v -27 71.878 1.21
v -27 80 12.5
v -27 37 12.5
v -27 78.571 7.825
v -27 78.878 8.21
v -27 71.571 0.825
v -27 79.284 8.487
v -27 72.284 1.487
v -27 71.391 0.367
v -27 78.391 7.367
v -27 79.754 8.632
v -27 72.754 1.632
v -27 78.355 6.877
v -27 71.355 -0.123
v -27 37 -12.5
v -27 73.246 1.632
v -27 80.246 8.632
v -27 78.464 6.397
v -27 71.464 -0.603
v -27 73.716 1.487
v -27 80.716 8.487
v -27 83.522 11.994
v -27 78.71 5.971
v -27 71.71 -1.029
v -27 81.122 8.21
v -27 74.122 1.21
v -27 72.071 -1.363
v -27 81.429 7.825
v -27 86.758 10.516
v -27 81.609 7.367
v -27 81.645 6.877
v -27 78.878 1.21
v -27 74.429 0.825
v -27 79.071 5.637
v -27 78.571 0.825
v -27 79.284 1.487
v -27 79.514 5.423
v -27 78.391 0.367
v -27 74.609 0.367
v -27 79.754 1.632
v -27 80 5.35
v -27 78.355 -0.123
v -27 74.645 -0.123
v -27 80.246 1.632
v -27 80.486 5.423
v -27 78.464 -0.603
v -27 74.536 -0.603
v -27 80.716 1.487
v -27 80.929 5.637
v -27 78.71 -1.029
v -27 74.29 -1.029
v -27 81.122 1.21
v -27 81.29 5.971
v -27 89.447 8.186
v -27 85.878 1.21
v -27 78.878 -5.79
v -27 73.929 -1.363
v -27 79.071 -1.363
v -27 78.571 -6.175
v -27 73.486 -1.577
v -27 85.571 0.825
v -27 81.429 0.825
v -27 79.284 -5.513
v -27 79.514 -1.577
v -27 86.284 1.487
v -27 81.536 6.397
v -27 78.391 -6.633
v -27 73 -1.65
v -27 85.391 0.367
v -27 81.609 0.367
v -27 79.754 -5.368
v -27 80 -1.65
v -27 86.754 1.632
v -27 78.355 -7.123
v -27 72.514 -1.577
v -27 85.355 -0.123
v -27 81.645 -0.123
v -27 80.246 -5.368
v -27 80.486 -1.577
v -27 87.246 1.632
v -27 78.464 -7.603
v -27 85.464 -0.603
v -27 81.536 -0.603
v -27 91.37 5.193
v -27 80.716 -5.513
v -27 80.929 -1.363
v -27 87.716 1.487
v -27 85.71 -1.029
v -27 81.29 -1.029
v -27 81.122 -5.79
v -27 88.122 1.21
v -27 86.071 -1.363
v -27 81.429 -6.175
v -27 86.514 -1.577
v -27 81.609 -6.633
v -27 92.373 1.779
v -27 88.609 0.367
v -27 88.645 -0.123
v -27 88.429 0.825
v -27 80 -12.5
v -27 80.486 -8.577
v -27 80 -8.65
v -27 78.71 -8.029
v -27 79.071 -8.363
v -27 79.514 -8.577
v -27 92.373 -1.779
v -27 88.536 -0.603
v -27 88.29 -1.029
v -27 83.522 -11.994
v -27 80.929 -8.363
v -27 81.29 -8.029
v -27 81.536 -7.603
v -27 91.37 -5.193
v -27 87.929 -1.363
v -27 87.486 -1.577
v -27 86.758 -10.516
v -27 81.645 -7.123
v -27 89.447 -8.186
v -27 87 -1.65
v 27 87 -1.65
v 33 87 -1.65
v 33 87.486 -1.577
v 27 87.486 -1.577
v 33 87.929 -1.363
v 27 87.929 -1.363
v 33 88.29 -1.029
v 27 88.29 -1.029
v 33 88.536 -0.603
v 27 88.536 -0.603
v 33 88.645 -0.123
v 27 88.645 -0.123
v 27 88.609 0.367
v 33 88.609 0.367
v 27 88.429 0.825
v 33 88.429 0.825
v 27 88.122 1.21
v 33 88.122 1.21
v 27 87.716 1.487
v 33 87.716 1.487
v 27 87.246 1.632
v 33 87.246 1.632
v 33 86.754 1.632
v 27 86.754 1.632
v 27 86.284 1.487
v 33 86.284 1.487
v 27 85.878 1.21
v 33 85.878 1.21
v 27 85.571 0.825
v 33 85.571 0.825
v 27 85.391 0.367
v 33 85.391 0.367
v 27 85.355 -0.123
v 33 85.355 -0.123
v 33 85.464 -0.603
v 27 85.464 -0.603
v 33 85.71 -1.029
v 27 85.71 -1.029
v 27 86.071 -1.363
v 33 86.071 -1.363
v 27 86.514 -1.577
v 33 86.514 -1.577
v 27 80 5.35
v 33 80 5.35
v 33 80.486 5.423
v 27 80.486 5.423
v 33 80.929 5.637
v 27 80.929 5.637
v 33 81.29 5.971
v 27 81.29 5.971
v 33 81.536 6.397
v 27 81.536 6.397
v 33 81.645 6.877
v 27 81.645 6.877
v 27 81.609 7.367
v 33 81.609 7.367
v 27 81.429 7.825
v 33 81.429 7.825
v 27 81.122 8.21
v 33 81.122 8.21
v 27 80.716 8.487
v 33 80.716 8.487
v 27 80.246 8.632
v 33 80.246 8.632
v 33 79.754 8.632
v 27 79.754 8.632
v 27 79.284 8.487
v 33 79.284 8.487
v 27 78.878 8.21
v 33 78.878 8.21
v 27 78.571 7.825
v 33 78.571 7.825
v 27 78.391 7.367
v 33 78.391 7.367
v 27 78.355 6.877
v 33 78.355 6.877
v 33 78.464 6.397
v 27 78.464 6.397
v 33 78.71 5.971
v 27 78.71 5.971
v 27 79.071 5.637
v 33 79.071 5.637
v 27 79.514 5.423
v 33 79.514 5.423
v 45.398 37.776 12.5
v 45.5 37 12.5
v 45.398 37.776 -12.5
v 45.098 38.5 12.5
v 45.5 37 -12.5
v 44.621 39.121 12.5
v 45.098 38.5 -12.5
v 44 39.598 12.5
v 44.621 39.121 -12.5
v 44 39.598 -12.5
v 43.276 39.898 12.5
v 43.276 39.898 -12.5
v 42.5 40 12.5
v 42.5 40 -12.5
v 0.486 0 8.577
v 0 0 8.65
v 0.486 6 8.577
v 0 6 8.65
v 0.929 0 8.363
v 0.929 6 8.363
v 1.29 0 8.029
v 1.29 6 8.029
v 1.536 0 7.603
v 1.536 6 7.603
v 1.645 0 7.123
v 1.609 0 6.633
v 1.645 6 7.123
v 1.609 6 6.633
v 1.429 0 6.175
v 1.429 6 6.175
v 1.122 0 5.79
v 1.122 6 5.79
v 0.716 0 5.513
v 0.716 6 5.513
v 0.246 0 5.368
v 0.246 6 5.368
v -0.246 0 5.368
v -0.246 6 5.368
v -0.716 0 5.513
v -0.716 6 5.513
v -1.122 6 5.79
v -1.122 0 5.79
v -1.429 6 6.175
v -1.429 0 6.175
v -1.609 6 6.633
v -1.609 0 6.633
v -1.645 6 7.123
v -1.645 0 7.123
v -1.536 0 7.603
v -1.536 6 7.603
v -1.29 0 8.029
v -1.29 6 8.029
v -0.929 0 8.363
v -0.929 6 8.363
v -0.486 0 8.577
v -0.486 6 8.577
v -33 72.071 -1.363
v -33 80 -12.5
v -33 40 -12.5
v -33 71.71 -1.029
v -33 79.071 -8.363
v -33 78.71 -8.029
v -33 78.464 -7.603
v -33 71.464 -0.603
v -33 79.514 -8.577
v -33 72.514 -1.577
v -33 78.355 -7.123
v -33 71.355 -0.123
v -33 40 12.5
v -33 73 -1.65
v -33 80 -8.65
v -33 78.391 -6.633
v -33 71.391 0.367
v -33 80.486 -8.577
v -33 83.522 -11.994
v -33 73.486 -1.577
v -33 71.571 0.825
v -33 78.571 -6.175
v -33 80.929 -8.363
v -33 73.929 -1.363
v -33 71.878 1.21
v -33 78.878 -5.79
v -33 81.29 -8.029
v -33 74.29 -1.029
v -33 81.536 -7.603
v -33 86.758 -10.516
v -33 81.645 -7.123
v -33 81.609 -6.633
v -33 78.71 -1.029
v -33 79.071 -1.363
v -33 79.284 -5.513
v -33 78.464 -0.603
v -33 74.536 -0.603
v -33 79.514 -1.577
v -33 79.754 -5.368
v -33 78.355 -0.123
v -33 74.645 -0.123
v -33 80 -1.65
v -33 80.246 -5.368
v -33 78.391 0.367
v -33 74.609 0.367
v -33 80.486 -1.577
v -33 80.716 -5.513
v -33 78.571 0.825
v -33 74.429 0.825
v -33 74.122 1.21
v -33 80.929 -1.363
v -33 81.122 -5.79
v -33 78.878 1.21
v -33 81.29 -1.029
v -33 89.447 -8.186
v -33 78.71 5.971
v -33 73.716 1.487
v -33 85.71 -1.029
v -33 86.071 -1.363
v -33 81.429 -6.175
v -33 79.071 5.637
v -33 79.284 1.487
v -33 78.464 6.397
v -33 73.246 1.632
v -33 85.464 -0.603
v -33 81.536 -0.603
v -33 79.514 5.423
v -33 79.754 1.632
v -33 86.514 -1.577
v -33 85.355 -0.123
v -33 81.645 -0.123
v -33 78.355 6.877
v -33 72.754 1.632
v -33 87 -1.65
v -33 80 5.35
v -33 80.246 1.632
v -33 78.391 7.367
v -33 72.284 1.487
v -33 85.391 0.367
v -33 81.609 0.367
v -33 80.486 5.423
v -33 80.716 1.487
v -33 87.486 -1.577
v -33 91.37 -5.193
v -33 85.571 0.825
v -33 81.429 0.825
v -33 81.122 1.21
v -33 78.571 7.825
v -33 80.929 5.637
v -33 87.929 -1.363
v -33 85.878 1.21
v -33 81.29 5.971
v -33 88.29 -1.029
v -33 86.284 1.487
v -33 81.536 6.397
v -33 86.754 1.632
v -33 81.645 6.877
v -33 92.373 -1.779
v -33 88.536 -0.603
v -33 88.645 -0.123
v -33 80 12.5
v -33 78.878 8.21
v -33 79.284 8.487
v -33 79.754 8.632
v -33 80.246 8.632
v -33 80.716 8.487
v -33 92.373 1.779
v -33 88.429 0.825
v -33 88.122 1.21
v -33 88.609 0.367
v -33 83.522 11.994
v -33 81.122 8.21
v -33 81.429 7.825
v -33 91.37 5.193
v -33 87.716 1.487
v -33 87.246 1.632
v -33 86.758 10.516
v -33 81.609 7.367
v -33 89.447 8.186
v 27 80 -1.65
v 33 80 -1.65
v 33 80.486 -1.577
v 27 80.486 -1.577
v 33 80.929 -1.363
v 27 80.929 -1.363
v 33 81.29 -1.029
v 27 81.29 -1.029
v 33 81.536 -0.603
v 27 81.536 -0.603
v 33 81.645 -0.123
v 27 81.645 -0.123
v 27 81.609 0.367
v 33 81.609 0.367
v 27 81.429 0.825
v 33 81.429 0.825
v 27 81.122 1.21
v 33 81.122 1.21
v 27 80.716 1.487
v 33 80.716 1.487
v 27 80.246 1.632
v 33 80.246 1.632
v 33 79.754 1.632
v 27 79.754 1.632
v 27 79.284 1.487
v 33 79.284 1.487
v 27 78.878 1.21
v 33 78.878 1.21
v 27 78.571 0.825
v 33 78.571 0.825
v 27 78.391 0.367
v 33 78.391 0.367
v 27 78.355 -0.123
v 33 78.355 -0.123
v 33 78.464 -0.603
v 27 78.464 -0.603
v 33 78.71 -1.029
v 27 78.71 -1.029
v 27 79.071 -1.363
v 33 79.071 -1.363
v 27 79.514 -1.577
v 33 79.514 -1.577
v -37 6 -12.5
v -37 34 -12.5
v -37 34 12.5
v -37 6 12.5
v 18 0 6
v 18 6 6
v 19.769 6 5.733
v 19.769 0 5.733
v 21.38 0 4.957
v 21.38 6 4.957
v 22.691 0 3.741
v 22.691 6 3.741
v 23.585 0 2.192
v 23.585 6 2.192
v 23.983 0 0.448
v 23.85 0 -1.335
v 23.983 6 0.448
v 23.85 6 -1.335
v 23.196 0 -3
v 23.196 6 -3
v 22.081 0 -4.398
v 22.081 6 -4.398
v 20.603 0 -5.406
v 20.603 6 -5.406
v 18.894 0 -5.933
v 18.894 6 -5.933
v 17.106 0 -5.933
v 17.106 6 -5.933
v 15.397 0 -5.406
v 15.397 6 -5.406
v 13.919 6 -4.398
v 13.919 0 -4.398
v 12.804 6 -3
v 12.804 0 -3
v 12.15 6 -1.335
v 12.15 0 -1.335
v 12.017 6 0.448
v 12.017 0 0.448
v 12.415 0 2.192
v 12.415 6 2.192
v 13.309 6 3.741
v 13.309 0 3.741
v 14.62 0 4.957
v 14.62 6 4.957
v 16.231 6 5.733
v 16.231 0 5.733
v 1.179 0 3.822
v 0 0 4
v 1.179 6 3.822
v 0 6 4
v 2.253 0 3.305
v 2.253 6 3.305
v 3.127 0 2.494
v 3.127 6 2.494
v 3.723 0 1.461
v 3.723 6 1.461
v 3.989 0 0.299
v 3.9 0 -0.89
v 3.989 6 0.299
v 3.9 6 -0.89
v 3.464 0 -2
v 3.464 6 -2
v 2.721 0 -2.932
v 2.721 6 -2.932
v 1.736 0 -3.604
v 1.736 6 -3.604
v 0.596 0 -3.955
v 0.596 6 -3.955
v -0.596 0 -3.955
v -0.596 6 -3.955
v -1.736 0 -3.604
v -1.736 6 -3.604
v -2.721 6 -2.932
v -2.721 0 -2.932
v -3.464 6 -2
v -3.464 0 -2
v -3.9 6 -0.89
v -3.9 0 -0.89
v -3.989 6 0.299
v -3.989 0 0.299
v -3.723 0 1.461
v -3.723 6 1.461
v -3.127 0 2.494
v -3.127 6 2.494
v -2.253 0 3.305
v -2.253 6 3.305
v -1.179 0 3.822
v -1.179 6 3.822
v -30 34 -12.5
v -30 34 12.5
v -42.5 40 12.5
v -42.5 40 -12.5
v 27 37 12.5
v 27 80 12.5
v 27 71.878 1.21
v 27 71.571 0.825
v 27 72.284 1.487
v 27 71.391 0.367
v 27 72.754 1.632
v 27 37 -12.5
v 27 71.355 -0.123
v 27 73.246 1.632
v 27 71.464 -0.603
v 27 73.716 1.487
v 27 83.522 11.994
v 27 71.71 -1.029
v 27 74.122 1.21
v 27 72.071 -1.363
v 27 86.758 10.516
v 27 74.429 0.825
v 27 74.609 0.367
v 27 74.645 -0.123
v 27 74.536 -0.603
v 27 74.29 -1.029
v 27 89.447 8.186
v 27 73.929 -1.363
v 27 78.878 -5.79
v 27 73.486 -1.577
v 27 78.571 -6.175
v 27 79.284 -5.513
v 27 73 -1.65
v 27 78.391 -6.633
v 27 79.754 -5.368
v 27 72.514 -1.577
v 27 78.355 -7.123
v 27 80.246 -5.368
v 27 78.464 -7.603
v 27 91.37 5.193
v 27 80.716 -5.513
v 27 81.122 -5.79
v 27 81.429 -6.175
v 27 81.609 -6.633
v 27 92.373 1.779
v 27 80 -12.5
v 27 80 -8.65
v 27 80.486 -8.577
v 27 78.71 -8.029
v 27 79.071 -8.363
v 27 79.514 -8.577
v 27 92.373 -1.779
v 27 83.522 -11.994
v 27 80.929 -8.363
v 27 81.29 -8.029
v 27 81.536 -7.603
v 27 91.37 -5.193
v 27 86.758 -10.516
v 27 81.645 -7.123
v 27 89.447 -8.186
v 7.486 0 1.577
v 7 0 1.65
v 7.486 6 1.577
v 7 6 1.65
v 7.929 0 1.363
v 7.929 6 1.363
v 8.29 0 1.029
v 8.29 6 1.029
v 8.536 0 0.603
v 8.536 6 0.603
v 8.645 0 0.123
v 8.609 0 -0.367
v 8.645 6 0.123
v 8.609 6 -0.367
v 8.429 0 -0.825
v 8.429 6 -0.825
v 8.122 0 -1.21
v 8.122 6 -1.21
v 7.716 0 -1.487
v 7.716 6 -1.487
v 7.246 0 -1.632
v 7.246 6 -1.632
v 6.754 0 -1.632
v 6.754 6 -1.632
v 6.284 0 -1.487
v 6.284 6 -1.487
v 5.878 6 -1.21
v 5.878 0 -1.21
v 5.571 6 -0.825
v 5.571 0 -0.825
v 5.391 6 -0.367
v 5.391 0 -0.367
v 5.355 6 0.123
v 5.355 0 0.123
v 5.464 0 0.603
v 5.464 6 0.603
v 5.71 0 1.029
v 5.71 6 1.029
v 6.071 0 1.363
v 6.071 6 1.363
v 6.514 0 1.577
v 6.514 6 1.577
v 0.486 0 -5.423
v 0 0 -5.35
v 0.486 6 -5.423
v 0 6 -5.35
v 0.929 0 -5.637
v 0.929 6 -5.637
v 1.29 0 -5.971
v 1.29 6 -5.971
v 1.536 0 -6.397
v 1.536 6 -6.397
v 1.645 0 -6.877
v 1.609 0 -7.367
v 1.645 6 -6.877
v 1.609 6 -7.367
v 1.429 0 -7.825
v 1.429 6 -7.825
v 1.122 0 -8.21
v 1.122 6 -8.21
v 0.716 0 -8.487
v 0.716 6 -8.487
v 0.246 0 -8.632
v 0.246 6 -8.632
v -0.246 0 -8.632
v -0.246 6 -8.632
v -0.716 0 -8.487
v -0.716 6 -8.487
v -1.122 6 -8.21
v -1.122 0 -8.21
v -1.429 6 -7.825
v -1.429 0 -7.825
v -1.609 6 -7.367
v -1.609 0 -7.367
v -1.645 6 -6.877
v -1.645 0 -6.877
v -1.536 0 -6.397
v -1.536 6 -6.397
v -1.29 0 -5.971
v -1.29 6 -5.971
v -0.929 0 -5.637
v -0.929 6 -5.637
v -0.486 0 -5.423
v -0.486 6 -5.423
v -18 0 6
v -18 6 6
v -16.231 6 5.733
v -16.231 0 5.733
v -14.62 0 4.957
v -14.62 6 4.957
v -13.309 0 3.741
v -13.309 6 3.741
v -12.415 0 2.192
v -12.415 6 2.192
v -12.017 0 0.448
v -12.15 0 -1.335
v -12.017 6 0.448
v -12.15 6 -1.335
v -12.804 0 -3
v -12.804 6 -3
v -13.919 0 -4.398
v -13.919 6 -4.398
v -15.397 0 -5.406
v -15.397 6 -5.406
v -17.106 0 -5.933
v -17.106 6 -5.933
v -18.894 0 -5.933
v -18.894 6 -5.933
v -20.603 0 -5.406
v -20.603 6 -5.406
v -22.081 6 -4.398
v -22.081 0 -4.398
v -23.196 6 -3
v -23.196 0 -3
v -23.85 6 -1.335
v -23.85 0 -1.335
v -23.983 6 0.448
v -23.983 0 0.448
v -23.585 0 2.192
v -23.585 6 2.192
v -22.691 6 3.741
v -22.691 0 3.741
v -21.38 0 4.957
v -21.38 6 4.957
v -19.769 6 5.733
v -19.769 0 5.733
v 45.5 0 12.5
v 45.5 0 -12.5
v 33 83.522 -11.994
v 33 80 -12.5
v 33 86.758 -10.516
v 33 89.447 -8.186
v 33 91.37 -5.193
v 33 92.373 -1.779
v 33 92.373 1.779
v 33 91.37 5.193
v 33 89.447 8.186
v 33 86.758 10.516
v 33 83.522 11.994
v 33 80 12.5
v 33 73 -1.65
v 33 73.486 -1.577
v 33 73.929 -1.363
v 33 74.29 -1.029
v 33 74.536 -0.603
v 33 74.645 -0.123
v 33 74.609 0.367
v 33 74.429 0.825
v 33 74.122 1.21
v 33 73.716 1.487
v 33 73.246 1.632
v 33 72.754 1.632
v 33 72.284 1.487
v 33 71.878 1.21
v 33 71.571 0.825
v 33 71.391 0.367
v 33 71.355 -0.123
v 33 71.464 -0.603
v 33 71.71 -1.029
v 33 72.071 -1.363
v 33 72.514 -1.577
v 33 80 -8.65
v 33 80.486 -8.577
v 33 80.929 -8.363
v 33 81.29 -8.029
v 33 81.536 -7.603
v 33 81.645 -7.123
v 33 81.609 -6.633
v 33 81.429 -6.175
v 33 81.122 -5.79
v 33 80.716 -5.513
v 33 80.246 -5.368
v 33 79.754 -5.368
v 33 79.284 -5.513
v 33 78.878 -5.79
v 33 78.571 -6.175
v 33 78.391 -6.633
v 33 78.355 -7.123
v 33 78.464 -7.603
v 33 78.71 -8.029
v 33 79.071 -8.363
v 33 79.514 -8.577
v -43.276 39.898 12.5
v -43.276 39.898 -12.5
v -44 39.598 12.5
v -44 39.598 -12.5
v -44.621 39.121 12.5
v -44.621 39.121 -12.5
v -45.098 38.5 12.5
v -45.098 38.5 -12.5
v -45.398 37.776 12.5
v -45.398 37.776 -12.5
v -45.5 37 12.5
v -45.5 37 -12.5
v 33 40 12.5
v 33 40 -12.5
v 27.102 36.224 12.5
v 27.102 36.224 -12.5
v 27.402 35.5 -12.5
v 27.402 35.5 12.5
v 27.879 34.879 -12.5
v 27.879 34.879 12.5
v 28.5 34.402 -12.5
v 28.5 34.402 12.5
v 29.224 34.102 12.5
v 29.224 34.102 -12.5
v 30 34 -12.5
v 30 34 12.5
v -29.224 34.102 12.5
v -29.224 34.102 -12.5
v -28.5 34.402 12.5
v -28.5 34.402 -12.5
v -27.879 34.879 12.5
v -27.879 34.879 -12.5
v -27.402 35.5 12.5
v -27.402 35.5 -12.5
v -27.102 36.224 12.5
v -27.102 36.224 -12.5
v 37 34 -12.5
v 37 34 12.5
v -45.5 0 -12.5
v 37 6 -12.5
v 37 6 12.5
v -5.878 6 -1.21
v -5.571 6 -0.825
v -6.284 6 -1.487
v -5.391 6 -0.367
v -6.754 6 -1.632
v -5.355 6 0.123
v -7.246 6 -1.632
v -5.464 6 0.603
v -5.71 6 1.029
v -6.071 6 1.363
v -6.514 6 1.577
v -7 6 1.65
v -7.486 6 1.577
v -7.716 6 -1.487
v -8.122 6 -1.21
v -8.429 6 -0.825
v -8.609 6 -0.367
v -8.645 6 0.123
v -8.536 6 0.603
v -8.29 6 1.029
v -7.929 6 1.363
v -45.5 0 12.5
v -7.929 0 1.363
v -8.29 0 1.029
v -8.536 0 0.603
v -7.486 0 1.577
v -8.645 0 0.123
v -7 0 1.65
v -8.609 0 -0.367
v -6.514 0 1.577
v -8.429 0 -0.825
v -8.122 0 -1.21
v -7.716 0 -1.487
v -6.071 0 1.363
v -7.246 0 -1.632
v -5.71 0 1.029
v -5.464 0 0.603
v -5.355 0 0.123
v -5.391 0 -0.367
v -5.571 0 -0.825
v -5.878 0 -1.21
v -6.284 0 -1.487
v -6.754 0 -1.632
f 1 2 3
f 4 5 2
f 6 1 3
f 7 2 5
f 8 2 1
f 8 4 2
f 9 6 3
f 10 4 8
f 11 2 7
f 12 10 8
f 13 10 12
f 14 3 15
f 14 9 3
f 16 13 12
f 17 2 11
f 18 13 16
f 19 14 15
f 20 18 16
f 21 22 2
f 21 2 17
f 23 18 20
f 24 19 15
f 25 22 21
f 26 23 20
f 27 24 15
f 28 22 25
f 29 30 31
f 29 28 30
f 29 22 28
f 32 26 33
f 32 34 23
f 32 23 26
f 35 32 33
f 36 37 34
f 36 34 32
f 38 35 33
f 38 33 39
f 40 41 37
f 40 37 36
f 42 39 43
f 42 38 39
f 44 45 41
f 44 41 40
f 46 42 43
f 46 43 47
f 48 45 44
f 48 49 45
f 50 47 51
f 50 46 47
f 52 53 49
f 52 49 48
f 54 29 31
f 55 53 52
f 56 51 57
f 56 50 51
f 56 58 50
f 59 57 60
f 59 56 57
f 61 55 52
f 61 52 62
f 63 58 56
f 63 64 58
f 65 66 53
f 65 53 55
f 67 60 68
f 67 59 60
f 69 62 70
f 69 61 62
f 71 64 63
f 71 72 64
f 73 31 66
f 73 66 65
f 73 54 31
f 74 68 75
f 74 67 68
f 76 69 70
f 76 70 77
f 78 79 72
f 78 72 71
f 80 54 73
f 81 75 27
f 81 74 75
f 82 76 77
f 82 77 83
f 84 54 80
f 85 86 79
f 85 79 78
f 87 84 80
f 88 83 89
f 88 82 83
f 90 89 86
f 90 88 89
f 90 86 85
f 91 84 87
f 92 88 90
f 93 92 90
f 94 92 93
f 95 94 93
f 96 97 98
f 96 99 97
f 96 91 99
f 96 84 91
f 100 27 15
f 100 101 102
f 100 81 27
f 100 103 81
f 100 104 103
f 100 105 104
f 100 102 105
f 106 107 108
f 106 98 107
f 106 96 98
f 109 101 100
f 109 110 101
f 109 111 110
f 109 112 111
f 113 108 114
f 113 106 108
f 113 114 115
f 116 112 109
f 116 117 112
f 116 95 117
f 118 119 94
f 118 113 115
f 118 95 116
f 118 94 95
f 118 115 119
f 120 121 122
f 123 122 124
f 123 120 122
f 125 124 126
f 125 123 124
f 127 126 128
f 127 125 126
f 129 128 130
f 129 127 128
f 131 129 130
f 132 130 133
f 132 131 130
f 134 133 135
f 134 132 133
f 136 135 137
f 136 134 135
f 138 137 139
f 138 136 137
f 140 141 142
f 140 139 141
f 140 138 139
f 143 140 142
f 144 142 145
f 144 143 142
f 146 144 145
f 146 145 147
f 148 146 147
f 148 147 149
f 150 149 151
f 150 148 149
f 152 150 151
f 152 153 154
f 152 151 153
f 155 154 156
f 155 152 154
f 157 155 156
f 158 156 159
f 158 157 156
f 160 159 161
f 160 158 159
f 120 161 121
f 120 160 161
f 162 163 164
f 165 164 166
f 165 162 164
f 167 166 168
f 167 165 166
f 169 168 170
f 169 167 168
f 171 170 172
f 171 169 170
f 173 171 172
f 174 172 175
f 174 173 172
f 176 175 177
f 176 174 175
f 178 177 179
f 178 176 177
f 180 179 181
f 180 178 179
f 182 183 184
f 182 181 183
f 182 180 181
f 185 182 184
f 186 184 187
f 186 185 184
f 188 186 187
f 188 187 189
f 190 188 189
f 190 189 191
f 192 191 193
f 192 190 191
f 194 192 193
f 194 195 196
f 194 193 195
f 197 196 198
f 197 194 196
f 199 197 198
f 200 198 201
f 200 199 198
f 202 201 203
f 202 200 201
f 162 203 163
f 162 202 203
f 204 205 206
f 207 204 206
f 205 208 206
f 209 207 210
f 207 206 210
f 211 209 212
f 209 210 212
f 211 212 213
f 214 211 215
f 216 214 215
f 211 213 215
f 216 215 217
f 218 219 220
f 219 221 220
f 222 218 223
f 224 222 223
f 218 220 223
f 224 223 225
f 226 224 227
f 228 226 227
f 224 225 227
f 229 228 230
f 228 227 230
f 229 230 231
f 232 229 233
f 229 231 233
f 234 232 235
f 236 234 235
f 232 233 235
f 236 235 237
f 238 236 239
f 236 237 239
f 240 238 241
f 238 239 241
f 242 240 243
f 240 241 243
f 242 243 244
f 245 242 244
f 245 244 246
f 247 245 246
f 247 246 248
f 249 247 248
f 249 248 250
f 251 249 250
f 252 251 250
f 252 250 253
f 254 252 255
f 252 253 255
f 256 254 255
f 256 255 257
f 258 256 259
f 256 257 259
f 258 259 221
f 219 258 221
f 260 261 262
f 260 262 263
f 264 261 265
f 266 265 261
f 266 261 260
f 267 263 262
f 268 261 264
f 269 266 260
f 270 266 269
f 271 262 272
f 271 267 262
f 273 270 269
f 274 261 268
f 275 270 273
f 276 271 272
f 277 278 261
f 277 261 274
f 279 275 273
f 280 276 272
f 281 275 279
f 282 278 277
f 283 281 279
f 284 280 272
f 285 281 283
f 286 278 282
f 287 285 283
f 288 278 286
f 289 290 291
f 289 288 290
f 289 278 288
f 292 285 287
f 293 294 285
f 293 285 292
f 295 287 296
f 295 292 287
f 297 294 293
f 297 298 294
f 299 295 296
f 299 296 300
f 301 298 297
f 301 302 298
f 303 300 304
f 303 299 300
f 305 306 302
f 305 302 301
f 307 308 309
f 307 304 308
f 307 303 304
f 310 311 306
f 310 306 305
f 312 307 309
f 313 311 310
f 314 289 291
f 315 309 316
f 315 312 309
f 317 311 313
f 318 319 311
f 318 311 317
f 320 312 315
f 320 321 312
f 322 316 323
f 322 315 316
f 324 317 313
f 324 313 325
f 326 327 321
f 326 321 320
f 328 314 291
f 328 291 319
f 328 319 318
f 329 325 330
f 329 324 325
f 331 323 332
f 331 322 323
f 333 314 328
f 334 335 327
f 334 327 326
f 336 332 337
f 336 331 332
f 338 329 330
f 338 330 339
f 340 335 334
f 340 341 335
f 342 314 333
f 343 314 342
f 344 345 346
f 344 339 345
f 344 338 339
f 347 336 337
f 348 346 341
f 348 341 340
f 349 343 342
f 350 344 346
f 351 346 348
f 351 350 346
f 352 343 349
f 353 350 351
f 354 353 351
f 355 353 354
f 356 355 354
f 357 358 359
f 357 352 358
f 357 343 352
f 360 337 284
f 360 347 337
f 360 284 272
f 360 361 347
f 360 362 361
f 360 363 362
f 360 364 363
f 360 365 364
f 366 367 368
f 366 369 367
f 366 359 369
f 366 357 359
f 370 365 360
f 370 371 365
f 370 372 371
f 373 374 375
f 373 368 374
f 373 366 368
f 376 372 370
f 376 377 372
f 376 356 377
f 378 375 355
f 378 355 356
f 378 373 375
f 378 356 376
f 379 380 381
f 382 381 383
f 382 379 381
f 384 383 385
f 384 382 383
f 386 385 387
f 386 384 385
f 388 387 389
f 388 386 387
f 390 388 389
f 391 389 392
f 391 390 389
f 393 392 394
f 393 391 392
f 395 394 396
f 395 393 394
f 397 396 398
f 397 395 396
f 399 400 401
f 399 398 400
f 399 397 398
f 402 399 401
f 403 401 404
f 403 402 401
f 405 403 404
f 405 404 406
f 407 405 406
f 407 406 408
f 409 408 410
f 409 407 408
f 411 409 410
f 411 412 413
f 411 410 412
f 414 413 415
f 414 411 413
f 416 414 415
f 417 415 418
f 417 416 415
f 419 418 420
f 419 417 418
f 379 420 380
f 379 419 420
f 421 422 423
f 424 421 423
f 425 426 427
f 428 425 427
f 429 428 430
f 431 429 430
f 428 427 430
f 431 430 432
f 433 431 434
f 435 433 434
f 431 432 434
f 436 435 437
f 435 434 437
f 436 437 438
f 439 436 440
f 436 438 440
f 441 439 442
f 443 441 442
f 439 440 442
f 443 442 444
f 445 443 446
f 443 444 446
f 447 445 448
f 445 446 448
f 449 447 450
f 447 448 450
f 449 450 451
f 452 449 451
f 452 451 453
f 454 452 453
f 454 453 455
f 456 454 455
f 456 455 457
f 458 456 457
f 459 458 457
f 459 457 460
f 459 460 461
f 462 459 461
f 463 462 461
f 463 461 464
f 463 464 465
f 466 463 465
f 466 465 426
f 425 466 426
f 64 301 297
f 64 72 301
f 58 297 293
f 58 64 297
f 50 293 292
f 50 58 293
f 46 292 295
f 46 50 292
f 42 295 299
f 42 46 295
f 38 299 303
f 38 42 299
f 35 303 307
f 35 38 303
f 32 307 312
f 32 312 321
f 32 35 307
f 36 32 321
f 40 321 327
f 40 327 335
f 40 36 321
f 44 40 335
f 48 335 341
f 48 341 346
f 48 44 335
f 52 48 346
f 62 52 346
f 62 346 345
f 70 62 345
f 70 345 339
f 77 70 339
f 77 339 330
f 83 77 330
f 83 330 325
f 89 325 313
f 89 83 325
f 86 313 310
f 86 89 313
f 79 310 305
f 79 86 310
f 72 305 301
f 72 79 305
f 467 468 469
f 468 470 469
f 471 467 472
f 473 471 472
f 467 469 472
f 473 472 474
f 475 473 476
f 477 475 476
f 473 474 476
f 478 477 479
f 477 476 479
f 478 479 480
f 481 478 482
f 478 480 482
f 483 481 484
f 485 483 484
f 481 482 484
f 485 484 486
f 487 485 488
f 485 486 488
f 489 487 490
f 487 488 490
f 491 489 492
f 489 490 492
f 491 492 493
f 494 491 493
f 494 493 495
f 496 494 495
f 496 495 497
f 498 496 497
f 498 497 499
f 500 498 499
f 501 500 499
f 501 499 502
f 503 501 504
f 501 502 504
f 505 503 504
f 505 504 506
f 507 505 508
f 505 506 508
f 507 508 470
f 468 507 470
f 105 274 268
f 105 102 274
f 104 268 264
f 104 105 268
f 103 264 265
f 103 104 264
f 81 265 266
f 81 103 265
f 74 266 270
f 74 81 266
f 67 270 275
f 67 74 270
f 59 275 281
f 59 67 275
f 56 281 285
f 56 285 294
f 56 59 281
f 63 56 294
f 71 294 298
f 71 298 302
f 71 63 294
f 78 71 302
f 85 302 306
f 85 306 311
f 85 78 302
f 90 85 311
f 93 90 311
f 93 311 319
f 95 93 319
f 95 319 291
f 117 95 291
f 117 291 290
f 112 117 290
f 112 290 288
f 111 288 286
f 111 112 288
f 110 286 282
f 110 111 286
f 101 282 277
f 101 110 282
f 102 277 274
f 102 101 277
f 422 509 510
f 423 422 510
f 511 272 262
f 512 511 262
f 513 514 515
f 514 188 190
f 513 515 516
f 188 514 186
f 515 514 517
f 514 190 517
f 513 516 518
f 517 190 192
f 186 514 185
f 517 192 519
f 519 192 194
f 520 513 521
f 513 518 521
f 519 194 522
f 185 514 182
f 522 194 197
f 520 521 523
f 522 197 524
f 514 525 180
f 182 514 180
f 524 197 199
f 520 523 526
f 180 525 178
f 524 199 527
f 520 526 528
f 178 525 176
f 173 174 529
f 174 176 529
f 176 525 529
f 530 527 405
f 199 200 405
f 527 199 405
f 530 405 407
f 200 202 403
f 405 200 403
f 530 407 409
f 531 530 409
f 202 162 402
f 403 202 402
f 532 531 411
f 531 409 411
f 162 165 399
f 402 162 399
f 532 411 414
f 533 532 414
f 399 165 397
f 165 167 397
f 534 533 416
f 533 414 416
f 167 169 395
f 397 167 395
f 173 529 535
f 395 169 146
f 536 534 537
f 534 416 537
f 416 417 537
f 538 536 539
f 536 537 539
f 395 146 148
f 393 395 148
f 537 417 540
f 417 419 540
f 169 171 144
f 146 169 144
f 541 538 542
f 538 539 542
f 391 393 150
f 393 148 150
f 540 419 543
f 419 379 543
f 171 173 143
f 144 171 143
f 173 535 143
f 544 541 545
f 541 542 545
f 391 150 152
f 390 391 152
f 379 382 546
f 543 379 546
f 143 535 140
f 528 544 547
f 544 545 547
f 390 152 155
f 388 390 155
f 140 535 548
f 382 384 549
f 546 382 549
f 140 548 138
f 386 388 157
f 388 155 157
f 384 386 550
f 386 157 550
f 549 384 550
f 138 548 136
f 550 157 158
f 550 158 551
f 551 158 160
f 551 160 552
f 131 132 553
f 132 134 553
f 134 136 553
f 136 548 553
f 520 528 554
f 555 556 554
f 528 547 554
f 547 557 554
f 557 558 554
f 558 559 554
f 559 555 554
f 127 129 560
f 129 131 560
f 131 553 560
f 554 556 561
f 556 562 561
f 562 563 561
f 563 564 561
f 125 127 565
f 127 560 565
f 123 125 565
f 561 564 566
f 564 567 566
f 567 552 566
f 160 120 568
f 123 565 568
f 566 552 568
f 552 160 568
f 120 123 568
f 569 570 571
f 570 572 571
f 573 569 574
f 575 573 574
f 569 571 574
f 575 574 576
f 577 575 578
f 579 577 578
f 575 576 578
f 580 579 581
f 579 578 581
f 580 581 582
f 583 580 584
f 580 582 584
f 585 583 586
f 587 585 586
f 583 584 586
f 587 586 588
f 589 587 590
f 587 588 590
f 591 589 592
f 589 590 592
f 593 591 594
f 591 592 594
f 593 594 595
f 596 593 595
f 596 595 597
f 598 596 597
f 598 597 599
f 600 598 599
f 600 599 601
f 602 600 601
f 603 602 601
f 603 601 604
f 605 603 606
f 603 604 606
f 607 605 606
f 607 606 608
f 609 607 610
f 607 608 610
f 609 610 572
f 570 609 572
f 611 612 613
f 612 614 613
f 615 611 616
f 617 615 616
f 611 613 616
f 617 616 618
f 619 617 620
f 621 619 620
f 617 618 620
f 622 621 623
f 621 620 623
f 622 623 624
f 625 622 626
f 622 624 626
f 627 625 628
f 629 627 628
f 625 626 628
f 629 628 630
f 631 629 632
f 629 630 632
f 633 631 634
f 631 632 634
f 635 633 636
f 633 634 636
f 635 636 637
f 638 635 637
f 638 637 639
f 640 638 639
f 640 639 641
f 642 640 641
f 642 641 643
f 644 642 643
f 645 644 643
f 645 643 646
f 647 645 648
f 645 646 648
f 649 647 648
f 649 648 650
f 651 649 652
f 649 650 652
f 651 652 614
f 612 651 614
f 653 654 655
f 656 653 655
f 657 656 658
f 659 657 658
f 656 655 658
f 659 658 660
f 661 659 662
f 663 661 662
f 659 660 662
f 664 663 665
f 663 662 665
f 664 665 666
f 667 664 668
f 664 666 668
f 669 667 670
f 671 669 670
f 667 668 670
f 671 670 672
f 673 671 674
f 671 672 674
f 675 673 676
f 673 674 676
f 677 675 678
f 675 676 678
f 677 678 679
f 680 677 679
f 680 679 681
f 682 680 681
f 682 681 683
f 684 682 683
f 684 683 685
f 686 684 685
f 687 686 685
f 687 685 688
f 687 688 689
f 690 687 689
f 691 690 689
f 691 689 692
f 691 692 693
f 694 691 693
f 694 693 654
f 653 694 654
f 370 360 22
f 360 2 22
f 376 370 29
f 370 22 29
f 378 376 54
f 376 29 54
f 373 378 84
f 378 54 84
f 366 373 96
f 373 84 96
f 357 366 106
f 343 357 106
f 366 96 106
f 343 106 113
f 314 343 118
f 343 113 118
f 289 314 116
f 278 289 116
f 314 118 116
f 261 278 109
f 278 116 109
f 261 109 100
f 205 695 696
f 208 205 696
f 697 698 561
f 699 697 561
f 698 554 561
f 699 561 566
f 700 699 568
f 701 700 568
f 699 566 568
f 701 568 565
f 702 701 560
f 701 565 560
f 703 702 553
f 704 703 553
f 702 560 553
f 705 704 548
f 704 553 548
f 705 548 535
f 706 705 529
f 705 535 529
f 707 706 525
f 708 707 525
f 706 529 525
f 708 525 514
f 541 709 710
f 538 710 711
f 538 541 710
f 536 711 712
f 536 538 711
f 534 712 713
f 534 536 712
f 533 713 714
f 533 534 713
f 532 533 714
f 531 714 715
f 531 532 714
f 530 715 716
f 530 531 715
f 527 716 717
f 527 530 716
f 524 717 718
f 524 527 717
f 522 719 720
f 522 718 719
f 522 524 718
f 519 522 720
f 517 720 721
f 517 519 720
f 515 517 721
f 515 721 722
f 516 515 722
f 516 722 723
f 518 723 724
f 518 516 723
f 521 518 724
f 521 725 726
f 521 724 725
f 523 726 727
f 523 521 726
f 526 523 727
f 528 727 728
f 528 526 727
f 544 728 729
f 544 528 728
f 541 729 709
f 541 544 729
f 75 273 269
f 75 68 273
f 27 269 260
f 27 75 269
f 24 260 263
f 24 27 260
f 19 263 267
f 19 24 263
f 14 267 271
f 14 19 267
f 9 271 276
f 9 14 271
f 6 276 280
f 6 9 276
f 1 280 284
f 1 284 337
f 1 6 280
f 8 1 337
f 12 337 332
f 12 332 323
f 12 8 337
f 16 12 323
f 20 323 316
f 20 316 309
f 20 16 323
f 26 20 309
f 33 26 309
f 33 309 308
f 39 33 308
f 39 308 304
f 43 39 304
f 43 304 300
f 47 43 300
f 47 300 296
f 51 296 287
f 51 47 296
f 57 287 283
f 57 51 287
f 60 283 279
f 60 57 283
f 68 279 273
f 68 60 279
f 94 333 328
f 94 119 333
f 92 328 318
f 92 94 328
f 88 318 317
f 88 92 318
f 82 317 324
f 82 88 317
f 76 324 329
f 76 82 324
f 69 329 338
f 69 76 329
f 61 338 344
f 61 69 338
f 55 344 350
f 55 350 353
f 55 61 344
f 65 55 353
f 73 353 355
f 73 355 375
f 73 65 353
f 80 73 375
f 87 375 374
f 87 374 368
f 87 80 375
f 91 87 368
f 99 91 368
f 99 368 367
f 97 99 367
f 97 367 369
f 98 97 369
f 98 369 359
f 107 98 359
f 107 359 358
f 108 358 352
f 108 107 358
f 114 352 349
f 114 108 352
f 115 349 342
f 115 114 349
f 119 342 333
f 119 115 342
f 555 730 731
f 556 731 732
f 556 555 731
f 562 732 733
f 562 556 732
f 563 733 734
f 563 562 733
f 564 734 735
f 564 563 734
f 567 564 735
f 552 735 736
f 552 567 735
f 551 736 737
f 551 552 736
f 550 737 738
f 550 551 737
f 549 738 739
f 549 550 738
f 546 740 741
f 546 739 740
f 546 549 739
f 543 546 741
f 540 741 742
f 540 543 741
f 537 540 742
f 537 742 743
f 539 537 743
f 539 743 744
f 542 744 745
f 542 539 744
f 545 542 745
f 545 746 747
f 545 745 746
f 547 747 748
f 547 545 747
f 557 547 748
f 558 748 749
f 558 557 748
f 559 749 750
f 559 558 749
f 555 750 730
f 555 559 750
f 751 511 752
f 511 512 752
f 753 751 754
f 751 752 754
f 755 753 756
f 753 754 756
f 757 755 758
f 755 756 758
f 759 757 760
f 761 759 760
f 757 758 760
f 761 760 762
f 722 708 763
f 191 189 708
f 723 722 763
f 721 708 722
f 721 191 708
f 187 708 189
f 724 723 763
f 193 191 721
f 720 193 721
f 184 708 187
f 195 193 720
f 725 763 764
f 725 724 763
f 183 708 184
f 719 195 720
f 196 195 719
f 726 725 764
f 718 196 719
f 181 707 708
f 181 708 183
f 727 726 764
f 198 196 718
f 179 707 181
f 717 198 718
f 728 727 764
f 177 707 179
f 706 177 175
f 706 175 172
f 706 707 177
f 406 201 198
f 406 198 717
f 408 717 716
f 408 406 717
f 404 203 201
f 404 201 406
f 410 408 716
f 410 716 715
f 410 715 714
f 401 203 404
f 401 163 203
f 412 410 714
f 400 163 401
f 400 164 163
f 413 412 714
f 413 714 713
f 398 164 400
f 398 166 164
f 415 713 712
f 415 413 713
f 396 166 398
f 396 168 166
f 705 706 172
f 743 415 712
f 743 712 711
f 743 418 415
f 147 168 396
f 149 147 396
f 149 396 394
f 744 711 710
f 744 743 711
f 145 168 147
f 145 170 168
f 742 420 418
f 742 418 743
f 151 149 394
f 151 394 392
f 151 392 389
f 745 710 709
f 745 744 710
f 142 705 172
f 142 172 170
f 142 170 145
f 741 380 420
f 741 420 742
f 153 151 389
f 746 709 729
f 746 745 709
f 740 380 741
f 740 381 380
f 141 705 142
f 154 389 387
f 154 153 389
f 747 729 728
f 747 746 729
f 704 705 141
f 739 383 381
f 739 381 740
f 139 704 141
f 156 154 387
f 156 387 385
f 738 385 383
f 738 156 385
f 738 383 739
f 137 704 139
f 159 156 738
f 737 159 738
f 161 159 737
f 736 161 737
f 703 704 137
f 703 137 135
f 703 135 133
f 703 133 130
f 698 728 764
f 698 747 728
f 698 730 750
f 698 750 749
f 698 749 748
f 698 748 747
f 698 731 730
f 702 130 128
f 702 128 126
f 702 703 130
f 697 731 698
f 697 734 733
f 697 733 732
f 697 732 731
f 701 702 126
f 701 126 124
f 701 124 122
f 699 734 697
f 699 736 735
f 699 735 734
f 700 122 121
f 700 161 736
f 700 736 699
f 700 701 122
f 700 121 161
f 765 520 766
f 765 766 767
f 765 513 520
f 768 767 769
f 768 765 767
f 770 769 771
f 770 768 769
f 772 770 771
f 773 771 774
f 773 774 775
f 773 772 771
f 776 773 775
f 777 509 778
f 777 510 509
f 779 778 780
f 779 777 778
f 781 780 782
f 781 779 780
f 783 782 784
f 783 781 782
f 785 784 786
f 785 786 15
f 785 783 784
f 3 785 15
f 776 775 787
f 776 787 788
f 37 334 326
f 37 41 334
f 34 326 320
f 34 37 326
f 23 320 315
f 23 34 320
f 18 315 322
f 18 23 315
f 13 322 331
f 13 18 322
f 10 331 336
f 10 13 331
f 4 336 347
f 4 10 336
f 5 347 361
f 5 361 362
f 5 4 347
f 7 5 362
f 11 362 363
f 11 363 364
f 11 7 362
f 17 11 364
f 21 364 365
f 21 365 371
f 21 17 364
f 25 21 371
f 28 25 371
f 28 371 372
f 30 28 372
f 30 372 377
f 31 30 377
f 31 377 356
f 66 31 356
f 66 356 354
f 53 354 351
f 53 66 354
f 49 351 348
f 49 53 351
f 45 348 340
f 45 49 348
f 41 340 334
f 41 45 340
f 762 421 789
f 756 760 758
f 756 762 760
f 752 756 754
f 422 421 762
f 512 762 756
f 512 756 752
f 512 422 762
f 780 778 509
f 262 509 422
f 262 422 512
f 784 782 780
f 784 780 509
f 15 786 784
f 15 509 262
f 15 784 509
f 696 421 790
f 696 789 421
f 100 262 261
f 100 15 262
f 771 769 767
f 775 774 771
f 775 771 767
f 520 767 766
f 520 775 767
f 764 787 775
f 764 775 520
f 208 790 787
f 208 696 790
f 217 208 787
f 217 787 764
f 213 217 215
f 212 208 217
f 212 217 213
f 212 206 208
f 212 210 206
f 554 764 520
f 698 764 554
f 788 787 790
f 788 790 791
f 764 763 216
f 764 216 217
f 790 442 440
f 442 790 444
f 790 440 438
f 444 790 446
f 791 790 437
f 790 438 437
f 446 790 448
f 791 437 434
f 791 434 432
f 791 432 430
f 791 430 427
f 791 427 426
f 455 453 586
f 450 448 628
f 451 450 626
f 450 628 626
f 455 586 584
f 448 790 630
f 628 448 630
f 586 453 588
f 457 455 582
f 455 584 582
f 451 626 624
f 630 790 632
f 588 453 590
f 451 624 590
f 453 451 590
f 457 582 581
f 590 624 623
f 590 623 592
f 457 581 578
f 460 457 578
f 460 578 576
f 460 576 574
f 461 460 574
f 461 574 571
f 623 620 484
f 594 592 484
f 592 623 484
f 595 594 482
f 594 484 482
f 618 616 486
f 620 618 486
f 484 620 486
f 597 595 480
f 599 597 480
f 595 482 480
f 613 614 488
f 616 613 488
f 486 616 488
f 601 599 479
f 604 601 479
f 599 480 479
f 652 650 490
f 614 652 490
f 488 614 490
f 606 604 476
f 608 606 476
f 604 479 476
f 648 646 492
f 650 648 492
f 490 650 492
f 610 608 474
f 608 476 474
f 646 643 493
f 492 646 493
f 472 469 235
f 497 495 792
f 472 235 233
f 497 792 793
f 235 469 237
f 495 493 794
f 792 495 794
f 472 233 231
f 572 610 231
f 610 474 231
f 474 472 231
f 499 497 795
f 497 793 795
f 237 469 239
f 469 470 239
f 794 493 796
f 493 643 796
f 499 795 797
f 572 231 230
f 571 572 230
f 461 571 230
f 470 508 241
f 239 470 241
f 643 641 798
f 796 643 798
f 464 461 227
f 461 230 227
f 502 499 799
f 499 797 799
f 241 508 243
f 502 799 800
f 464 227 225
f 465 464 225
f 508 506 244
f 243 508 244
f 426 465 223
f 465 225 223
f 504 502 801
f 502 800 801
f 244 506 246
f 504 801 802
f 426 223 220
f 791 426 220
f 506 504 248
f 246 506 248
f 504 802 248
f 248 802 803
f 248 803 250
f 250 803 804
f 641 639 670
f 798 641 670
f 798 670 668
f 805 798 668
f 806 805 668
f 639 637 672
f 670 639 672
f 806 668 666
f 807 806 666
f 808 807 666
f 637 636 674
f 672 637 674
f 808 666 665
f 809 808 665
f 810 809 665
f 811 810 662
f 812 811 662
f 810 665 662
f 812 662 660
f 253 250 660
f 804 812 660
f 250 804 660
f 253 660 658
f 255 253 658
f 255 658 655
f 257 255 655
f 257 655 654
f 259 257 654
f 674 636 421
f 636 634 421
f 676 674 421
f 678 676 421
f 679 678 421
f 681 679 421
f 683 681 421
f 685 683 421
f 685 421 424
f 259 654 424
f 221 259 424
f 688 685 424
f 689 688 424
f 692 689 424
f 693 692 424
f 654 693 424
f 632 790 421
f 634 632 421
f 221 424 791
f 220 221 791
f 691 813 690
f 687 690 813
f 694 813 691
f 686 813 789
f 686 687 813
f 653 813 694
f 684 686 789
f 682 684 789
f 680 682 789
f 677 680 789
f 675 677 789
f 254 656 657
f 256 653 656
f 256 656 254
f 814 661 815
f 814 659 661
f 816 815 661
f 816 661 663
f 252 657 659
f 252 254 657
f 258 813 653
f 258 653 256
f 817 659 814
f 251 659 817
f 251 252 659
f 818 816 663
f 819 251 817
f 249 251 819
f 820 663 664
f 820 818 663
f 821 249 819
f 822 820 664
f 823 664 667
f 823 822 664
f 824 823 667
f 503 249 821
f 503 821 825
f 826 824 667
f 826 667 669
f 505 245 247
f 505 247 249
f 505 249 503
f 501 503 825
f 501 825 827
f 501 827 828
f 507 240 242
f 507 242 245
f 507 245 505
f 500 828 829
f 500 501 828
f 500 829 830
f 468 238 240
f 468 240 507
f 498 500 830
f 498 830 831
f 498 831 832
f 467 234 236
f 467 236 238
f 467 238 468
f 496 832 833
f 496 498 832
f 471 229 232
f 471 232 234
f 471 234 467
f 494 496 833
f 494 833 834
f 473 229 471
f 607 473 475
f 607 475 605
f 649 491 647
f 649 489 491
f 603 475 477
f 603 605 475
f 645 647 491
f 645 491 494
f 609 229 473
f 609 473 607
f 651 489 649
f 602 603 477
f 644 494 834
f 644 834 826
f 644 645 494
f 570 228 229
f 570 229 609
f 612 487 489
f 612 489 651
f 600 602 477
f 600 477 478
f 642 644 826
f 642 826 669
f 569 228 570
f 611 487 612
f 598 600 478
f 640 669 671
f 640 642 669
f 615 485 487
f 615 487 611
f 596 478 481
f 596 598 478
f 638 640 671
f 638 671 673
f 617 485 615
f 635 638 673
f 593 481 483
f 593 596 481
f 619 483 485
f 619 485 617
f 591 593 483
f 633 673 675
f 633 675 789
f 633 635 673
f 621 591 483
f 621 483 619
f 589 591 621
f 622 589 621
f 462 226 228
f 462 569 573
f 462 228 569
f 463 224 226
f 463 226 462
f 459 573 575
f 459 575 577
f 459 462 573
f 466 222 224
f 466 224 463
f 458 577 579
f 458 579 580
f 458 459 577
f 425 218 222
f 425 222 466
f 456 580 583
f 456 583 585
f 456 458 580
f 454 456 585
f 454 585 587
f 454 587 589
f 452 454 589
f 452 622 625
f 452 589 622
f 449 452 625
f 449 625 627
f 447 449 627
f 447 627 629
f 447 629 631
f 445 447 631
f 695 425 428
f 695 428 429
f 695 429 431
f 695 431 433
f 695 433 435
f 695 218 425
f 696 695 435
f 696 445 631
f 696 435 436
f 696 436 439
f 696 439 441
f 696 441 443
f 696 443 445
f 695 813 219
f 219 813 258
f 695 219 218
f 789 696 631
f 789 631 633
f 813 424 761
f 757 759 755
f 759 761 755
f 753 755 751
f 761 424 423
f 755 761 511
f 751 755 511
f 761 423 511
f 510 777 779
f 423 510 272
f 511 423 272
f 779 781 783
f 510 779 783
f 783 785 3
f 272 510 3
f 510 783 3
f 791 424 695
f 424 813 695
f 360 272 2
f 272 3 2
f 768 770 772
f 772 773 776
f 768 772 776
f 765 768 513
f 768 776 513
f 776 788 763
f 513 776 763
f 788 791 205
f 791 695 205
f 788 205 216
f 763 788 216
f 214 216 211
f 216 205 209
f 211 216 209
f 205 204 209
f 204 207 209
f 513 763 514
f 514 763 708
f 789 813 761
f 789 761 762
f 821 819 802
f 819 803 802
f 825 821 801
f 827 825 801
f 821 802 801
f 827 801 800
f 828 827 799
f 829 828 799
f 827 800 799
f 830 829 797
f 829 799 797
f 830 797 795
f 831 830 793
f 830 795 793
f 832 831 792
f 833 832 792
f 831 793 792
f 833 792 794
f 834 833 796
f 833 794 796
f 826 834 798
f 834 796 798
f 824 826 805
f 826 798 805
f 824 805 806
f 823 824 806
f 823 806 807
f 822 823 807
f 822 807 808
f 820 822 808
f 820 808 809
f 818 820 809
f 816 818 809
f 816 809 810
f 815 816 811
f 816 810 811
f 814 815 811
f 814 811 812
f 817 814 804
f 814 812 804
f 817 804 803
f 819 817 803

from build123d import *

# Parameters (mm, degrees)
SKETCH_1_W          = 58
SKETCH_1_H          = 25
EXTRUDE_1_DEPTH     = 6
SKETCH_2_R          = 4
SKETCH_2_R_2        = 1.65
CUT_EXTRUDE_1_DEPTH = 2
EXTRUDE_2_DEPTH     = 2
SKETCH_4_R          = 1.65
CUT_EXTRUDE_2_DEPTH = 2
EXTRUDE_3_DEPTH     = 4
SKETCH_5_R          = 1.65
EXTRUDE_4_DEPTH     = 4
SKETCH_4_2_R        = 1.65
CUT_EXTRUDE_3_DEPTH = 6
SKETCH_2_2_R        = 4
SKETCH_2_2_R_2      = 1.65
CUT_EXTRUDE_4_DEPTH = 6
CUT_EXTRUDE_5_REACH = 95.421
SKETCH_6_R          = 6
SKETCH_9_W          = 25
SKETCH_9_H          = 40
EXTRUDE_6_DEPTH     = 12.5
SKETCH_10_W         = 25
SKETCH_10_H         = 28
CUT_EXTRUDE_6_DEPTH = 10
FILLET_1_R          = 3


with BuildPart() as part:
    # 草图1 → 凸台-拉伸1 (new body)
    with BuildSketch(Plane(origin=(0, 0, 0), x_dir=(1, 0, 0), z_dir=(0, 1, 0))):
        Rectangle(SKETCH_1_W, SKETCH_1_H)
    extrude(amount=EXTRUDE_1_DEPTH)

    # 草图2 → 切除-拉伸1 (cut)
    with BuildSketch(Plane(origin=(0, 6, 0), x_dir=(1, 0, 0), z_dir=(0, 1, 0))):
        with Locations(Location((0, 0, 0), (0, 0, 270))):
            Circle(SKETCH_2_R)
        with Locations(Location((0, 7, 0), (0, 0, 270))):
            Circle(SKETCH_2_R_2)
        with Locations(Location((7, 0, 0), (0, 0, 270))):
            Circle(SKETCH_2_R_2)
        with Locations(Location((0, -7, 0), (0, 0, 270))):
            Circle(SKETCH_2_R_2)
        with Locations(Location((-7, 0, 0), (0, 0, 270))):
            Circle(SKETCH_2_R_2)
    extrude(amount=-CUT_EXTRUDE_1_DEPTH, mode=Mode.SUBTRACT)

    # 草图3 → 凸台-拉伸2 (add)
    with BuildSketch(Plane(origin=(29, 0, 0), x_dir=(0, 0, -1), z_dir=(1, 0, 0))):
        with BuildLine():
            Line((0, 6), (12.5, 6))
            Line((12.5, 6), (12.5, 80))
            ThreePointArc((12.5, 80), (0, 92.5), (-12.5, 80))
            Line((-12.5, 80), (-12.5, 6))
            Line((-12.5, 6), (0, 6))
        make_face()
    extrude_2 = extrude(amount=-EXTRUDE_2_DEPTH)

    # 草图4 → 切除-拉伸2 (cut)
    with BuildSketch(Plane(origin=(29, 0, 0), x_dir=(0, 0, -1), z_dir=(1, 0, 0))):
        with Locations((0, 87)):
            Circle(SKETCH_4_R)
        with Locations((7, 80)):
            Circle(SKETCH_4_R)
        with Locations((0, 73)):
            Circle(SKETCH_4_R)
        with Locations((-7, 80)):
            Circle(SKETCH_4_R)
        with Locations((0, 80)):
            Circle(SKETCH_4_R)
    cut_extrude_2 = extrude(amount=-CUT_EXTRUDE_2_DEPTH, mode=Mode.SUBTRACT)

    # 镜向1: 凸台-拉伸2, 切除-拉伸2 across plane
    add(extrude_2.mirror(Plane(origin=(0, 0, 0), x_dir=(0, 0, 1), z_dir=(1, 0, 0))))
    add(cut_extrude_2.mirror(Plane(origin=(0, 0, 0), x_dir=(0, 0, 1), z_dir=(1, 0, 0))), mode=Mode.SUBTRACT)

    # 草图3<3> → 凸台-拉伸3 (add)
    with BuildSketch(Plane(origin=(29, 0, 0), x_dir=(0, 0, -1), z_dir=(1, 0, 0))):
        with BuildLine():
            Line((0, 0), (12.5, 0))
            Line((12.5, 0), (12.5, 80))
            ThreePointArc((12.5, 80), (0, 92.5), (-12.5, 80))
            Line((-12.5, 80), (-12.5, 0))
            Line((-12.5, 0), (0, 0))
        make_face()
    extrude(amount=EXTRUDE_3_DEPTH)

    # 草图5 → 凸台-拉伸4 (add)
    with BuildSketch(Plane.ZY.offset(29)):
        with BuildLine():
            Line((-12.5, 0), (12.5, 0))
            Line((12.5, 0), (12.5, 80))
            ThreePointArc((12.5, 80), (0, 92.5), (-12.5, 80))
            Line((-12.5, 80), (-12.5, 0))
        make_face()
        with Locations(Location((0, 73, 0), (0, 0, 180))):
            Circle(SKETCH_5_R, mode=Mode.SUBTRACT)
        with Locations(Location((0, 87, 0), (0, 0, 180))):
            Circle(SKETCH_5_R, mode=Mode.SUBTRACT)
        with Locations(Location((-7, 80, 0), (0, 0, 180))):
            Circle(SKETCH_5_R, mode=Mode.SUBTRACT)
        with Locations(Location((0, 80, 0), (0, 0, 180))):
            Circle(SKETCH_5_R, mode=Mode.SUBTRACT)
        with Locations(Location((7, 80, 0), (0, 0, 180))):
            Circle(SKETCH_5_R, mode=Mode.SUBTRACT)
    extrude(amount=EXTRUDE_4_DEPTH)

    # 草图4<2> → 切除-拉伸3 (cut)
    with BuildSketch(Plane(origin=(29, 0, 0), x_dir=(0, 0, -1), z_dir=(1, 0, 0))):
        with Locations((0, 87)):
            Circle(SKETCH_4_2_R)
        with Locations((7, 80)):
            Circle(SKETCH_4_2_R)
        with Locations((0, 73)):
            Circle(SKETCH_4_2_R)
        with Locations((-7, 80)):
            Circle(SKETCH_4_2_R)
        with Locations((0, 80)):
            Circle(SKETCH_4_2_R)
    extrude(amount=CUT_EXTRUDE_3_DEPTH, mode=Mode.SUBTRACT)

    # 草图2<2> → 切除-拉伸4 (cut)
    with BuildSketch(Plane(origin=(0, 6, 0), x_dir=(1, 0, 0), z_dir=(0, 1, 0))):
        with Locations(Location((0, 0, 0), (0, 0, 270))):
            Circle(SKETCH_2_2_R)
        with Locations(Location((0, 7, 0), (0, 0, 270))):
            Circle(SKETCH_2_2_R_2)
        with Locations(Location((7, 0, 0), (0, 0, 270))):
            Circle(SKETCH_2_2_R_2)
        with Locations(Location((0, -7, 0), (0, 0, 270))):
            Circle(SKETCH_2_2_R_2)
        with Locations(Location((-7, 0, 0), (0, 0, 270))):
            Circle(SKETCH_2_2_R_2)
    extrude(amount=-CUT_EXTRUDE_4_DEPTH, mode=Mode.SUBTRACT)

    # 草图6 → 切除-拉伸5 (cut, up to next)
    with BuildSketch(Plane(origin=(0, 6, 0), x_dir=(1, 0, 0), z_dir=(0, 1, 0)), mode=Mode.PRIVATE) as cut_extrude_5_sk1:
        with Locations(Location((-18, 0, 0), (0, 0, 270))):
            Circle(SKETCH_6_R)
    cut_extrude_5_tool1 = extrude(cut_extrude_5_sk1.sketch, amount=-CUT_EXTRUDE_5_REACH, mode=Mode.PRIVATE) & part.part
    # 草图6 → 切除-拉伸5 (cut, up to next)
    with BuildSketch(Plane(origin=(0, 6, 0), x_dir=(1, 0, 0), z_dir=(0, 1, 0)), mode=Mode.PRIVATE) as cut_extrude_5_sk2:
        with Locations(Location((18, 0, 0), (0, 0, 270))):
            Circle(SKETCH_6_R)
    cut_extrude_5_tool2 = extrude(cut_extrude_5_sk2.sketch, amount=-CUT_EXTRUDE_5_REACH, mode=Mode.PRIVATE) & part.part
    add(cut_extrude_5_tool1.solids().sort_by_distance((-18, 6, 0))[0], mode=Mode.SUBTRACT)
    add(cut_extrude_5_tool2.solids().sort_by_distance((18, 6, 0))[0], mode=Mode.SUBTRACT)

    # 草图9 → 凸台-拉伸6 (add)
    with BuildSketch(Plane(origin=(33, 0, 0), x_dir=(0, 0, -1), z_dir=(1, 0, 0))):
        with Locations((0, 20)):
            Rectangle(SKETCH_9_W, SKETCH_9_H)
    extrude_6 = extrude(amount=EXTRUDE_6_DEPTH)

    # 镜向2: 凸台-拉伸6 across plane
    add(extrude_6.mirror(Plane(origin=(0, 0, 0), x_dir=(0, 0, 1), z_dir=(1, 0, 0))))

    # 草图10 → 切除-拉伸6 (cut)
    with BuildSketch(Plane.ZY.offset(-27)):
        with Locations((0, 20)):
            Rectangle(SKETCH_10_W, SKETCH_10_H)
    cut_extrude_6 = extrude(amount=-CUT_EXTRUDE_6_DEPTH, mode=Mode.SUBTRACT)

    # 镜向3: 切除-拉伸6 across plane
    add(cut_extrude_6.mirror(Plane(origin=(0, 0, 0), x_dir=(0, 0, 1), z_dir=(1, 0, 0))), mode=Mode.SUBTRACT)

    # 圆角1
    fillet_1_edges = [part.edges().sort_by_distance(p)[0] for p in [
        (45.5, 40, 0),
        (-45.5, 40, 0),
        (27, 34, 0),
        (-27, 34, 0),
    ]]
    fillet(fillet_1_edges, radius=FILLET_1_R)


solid = part.part
